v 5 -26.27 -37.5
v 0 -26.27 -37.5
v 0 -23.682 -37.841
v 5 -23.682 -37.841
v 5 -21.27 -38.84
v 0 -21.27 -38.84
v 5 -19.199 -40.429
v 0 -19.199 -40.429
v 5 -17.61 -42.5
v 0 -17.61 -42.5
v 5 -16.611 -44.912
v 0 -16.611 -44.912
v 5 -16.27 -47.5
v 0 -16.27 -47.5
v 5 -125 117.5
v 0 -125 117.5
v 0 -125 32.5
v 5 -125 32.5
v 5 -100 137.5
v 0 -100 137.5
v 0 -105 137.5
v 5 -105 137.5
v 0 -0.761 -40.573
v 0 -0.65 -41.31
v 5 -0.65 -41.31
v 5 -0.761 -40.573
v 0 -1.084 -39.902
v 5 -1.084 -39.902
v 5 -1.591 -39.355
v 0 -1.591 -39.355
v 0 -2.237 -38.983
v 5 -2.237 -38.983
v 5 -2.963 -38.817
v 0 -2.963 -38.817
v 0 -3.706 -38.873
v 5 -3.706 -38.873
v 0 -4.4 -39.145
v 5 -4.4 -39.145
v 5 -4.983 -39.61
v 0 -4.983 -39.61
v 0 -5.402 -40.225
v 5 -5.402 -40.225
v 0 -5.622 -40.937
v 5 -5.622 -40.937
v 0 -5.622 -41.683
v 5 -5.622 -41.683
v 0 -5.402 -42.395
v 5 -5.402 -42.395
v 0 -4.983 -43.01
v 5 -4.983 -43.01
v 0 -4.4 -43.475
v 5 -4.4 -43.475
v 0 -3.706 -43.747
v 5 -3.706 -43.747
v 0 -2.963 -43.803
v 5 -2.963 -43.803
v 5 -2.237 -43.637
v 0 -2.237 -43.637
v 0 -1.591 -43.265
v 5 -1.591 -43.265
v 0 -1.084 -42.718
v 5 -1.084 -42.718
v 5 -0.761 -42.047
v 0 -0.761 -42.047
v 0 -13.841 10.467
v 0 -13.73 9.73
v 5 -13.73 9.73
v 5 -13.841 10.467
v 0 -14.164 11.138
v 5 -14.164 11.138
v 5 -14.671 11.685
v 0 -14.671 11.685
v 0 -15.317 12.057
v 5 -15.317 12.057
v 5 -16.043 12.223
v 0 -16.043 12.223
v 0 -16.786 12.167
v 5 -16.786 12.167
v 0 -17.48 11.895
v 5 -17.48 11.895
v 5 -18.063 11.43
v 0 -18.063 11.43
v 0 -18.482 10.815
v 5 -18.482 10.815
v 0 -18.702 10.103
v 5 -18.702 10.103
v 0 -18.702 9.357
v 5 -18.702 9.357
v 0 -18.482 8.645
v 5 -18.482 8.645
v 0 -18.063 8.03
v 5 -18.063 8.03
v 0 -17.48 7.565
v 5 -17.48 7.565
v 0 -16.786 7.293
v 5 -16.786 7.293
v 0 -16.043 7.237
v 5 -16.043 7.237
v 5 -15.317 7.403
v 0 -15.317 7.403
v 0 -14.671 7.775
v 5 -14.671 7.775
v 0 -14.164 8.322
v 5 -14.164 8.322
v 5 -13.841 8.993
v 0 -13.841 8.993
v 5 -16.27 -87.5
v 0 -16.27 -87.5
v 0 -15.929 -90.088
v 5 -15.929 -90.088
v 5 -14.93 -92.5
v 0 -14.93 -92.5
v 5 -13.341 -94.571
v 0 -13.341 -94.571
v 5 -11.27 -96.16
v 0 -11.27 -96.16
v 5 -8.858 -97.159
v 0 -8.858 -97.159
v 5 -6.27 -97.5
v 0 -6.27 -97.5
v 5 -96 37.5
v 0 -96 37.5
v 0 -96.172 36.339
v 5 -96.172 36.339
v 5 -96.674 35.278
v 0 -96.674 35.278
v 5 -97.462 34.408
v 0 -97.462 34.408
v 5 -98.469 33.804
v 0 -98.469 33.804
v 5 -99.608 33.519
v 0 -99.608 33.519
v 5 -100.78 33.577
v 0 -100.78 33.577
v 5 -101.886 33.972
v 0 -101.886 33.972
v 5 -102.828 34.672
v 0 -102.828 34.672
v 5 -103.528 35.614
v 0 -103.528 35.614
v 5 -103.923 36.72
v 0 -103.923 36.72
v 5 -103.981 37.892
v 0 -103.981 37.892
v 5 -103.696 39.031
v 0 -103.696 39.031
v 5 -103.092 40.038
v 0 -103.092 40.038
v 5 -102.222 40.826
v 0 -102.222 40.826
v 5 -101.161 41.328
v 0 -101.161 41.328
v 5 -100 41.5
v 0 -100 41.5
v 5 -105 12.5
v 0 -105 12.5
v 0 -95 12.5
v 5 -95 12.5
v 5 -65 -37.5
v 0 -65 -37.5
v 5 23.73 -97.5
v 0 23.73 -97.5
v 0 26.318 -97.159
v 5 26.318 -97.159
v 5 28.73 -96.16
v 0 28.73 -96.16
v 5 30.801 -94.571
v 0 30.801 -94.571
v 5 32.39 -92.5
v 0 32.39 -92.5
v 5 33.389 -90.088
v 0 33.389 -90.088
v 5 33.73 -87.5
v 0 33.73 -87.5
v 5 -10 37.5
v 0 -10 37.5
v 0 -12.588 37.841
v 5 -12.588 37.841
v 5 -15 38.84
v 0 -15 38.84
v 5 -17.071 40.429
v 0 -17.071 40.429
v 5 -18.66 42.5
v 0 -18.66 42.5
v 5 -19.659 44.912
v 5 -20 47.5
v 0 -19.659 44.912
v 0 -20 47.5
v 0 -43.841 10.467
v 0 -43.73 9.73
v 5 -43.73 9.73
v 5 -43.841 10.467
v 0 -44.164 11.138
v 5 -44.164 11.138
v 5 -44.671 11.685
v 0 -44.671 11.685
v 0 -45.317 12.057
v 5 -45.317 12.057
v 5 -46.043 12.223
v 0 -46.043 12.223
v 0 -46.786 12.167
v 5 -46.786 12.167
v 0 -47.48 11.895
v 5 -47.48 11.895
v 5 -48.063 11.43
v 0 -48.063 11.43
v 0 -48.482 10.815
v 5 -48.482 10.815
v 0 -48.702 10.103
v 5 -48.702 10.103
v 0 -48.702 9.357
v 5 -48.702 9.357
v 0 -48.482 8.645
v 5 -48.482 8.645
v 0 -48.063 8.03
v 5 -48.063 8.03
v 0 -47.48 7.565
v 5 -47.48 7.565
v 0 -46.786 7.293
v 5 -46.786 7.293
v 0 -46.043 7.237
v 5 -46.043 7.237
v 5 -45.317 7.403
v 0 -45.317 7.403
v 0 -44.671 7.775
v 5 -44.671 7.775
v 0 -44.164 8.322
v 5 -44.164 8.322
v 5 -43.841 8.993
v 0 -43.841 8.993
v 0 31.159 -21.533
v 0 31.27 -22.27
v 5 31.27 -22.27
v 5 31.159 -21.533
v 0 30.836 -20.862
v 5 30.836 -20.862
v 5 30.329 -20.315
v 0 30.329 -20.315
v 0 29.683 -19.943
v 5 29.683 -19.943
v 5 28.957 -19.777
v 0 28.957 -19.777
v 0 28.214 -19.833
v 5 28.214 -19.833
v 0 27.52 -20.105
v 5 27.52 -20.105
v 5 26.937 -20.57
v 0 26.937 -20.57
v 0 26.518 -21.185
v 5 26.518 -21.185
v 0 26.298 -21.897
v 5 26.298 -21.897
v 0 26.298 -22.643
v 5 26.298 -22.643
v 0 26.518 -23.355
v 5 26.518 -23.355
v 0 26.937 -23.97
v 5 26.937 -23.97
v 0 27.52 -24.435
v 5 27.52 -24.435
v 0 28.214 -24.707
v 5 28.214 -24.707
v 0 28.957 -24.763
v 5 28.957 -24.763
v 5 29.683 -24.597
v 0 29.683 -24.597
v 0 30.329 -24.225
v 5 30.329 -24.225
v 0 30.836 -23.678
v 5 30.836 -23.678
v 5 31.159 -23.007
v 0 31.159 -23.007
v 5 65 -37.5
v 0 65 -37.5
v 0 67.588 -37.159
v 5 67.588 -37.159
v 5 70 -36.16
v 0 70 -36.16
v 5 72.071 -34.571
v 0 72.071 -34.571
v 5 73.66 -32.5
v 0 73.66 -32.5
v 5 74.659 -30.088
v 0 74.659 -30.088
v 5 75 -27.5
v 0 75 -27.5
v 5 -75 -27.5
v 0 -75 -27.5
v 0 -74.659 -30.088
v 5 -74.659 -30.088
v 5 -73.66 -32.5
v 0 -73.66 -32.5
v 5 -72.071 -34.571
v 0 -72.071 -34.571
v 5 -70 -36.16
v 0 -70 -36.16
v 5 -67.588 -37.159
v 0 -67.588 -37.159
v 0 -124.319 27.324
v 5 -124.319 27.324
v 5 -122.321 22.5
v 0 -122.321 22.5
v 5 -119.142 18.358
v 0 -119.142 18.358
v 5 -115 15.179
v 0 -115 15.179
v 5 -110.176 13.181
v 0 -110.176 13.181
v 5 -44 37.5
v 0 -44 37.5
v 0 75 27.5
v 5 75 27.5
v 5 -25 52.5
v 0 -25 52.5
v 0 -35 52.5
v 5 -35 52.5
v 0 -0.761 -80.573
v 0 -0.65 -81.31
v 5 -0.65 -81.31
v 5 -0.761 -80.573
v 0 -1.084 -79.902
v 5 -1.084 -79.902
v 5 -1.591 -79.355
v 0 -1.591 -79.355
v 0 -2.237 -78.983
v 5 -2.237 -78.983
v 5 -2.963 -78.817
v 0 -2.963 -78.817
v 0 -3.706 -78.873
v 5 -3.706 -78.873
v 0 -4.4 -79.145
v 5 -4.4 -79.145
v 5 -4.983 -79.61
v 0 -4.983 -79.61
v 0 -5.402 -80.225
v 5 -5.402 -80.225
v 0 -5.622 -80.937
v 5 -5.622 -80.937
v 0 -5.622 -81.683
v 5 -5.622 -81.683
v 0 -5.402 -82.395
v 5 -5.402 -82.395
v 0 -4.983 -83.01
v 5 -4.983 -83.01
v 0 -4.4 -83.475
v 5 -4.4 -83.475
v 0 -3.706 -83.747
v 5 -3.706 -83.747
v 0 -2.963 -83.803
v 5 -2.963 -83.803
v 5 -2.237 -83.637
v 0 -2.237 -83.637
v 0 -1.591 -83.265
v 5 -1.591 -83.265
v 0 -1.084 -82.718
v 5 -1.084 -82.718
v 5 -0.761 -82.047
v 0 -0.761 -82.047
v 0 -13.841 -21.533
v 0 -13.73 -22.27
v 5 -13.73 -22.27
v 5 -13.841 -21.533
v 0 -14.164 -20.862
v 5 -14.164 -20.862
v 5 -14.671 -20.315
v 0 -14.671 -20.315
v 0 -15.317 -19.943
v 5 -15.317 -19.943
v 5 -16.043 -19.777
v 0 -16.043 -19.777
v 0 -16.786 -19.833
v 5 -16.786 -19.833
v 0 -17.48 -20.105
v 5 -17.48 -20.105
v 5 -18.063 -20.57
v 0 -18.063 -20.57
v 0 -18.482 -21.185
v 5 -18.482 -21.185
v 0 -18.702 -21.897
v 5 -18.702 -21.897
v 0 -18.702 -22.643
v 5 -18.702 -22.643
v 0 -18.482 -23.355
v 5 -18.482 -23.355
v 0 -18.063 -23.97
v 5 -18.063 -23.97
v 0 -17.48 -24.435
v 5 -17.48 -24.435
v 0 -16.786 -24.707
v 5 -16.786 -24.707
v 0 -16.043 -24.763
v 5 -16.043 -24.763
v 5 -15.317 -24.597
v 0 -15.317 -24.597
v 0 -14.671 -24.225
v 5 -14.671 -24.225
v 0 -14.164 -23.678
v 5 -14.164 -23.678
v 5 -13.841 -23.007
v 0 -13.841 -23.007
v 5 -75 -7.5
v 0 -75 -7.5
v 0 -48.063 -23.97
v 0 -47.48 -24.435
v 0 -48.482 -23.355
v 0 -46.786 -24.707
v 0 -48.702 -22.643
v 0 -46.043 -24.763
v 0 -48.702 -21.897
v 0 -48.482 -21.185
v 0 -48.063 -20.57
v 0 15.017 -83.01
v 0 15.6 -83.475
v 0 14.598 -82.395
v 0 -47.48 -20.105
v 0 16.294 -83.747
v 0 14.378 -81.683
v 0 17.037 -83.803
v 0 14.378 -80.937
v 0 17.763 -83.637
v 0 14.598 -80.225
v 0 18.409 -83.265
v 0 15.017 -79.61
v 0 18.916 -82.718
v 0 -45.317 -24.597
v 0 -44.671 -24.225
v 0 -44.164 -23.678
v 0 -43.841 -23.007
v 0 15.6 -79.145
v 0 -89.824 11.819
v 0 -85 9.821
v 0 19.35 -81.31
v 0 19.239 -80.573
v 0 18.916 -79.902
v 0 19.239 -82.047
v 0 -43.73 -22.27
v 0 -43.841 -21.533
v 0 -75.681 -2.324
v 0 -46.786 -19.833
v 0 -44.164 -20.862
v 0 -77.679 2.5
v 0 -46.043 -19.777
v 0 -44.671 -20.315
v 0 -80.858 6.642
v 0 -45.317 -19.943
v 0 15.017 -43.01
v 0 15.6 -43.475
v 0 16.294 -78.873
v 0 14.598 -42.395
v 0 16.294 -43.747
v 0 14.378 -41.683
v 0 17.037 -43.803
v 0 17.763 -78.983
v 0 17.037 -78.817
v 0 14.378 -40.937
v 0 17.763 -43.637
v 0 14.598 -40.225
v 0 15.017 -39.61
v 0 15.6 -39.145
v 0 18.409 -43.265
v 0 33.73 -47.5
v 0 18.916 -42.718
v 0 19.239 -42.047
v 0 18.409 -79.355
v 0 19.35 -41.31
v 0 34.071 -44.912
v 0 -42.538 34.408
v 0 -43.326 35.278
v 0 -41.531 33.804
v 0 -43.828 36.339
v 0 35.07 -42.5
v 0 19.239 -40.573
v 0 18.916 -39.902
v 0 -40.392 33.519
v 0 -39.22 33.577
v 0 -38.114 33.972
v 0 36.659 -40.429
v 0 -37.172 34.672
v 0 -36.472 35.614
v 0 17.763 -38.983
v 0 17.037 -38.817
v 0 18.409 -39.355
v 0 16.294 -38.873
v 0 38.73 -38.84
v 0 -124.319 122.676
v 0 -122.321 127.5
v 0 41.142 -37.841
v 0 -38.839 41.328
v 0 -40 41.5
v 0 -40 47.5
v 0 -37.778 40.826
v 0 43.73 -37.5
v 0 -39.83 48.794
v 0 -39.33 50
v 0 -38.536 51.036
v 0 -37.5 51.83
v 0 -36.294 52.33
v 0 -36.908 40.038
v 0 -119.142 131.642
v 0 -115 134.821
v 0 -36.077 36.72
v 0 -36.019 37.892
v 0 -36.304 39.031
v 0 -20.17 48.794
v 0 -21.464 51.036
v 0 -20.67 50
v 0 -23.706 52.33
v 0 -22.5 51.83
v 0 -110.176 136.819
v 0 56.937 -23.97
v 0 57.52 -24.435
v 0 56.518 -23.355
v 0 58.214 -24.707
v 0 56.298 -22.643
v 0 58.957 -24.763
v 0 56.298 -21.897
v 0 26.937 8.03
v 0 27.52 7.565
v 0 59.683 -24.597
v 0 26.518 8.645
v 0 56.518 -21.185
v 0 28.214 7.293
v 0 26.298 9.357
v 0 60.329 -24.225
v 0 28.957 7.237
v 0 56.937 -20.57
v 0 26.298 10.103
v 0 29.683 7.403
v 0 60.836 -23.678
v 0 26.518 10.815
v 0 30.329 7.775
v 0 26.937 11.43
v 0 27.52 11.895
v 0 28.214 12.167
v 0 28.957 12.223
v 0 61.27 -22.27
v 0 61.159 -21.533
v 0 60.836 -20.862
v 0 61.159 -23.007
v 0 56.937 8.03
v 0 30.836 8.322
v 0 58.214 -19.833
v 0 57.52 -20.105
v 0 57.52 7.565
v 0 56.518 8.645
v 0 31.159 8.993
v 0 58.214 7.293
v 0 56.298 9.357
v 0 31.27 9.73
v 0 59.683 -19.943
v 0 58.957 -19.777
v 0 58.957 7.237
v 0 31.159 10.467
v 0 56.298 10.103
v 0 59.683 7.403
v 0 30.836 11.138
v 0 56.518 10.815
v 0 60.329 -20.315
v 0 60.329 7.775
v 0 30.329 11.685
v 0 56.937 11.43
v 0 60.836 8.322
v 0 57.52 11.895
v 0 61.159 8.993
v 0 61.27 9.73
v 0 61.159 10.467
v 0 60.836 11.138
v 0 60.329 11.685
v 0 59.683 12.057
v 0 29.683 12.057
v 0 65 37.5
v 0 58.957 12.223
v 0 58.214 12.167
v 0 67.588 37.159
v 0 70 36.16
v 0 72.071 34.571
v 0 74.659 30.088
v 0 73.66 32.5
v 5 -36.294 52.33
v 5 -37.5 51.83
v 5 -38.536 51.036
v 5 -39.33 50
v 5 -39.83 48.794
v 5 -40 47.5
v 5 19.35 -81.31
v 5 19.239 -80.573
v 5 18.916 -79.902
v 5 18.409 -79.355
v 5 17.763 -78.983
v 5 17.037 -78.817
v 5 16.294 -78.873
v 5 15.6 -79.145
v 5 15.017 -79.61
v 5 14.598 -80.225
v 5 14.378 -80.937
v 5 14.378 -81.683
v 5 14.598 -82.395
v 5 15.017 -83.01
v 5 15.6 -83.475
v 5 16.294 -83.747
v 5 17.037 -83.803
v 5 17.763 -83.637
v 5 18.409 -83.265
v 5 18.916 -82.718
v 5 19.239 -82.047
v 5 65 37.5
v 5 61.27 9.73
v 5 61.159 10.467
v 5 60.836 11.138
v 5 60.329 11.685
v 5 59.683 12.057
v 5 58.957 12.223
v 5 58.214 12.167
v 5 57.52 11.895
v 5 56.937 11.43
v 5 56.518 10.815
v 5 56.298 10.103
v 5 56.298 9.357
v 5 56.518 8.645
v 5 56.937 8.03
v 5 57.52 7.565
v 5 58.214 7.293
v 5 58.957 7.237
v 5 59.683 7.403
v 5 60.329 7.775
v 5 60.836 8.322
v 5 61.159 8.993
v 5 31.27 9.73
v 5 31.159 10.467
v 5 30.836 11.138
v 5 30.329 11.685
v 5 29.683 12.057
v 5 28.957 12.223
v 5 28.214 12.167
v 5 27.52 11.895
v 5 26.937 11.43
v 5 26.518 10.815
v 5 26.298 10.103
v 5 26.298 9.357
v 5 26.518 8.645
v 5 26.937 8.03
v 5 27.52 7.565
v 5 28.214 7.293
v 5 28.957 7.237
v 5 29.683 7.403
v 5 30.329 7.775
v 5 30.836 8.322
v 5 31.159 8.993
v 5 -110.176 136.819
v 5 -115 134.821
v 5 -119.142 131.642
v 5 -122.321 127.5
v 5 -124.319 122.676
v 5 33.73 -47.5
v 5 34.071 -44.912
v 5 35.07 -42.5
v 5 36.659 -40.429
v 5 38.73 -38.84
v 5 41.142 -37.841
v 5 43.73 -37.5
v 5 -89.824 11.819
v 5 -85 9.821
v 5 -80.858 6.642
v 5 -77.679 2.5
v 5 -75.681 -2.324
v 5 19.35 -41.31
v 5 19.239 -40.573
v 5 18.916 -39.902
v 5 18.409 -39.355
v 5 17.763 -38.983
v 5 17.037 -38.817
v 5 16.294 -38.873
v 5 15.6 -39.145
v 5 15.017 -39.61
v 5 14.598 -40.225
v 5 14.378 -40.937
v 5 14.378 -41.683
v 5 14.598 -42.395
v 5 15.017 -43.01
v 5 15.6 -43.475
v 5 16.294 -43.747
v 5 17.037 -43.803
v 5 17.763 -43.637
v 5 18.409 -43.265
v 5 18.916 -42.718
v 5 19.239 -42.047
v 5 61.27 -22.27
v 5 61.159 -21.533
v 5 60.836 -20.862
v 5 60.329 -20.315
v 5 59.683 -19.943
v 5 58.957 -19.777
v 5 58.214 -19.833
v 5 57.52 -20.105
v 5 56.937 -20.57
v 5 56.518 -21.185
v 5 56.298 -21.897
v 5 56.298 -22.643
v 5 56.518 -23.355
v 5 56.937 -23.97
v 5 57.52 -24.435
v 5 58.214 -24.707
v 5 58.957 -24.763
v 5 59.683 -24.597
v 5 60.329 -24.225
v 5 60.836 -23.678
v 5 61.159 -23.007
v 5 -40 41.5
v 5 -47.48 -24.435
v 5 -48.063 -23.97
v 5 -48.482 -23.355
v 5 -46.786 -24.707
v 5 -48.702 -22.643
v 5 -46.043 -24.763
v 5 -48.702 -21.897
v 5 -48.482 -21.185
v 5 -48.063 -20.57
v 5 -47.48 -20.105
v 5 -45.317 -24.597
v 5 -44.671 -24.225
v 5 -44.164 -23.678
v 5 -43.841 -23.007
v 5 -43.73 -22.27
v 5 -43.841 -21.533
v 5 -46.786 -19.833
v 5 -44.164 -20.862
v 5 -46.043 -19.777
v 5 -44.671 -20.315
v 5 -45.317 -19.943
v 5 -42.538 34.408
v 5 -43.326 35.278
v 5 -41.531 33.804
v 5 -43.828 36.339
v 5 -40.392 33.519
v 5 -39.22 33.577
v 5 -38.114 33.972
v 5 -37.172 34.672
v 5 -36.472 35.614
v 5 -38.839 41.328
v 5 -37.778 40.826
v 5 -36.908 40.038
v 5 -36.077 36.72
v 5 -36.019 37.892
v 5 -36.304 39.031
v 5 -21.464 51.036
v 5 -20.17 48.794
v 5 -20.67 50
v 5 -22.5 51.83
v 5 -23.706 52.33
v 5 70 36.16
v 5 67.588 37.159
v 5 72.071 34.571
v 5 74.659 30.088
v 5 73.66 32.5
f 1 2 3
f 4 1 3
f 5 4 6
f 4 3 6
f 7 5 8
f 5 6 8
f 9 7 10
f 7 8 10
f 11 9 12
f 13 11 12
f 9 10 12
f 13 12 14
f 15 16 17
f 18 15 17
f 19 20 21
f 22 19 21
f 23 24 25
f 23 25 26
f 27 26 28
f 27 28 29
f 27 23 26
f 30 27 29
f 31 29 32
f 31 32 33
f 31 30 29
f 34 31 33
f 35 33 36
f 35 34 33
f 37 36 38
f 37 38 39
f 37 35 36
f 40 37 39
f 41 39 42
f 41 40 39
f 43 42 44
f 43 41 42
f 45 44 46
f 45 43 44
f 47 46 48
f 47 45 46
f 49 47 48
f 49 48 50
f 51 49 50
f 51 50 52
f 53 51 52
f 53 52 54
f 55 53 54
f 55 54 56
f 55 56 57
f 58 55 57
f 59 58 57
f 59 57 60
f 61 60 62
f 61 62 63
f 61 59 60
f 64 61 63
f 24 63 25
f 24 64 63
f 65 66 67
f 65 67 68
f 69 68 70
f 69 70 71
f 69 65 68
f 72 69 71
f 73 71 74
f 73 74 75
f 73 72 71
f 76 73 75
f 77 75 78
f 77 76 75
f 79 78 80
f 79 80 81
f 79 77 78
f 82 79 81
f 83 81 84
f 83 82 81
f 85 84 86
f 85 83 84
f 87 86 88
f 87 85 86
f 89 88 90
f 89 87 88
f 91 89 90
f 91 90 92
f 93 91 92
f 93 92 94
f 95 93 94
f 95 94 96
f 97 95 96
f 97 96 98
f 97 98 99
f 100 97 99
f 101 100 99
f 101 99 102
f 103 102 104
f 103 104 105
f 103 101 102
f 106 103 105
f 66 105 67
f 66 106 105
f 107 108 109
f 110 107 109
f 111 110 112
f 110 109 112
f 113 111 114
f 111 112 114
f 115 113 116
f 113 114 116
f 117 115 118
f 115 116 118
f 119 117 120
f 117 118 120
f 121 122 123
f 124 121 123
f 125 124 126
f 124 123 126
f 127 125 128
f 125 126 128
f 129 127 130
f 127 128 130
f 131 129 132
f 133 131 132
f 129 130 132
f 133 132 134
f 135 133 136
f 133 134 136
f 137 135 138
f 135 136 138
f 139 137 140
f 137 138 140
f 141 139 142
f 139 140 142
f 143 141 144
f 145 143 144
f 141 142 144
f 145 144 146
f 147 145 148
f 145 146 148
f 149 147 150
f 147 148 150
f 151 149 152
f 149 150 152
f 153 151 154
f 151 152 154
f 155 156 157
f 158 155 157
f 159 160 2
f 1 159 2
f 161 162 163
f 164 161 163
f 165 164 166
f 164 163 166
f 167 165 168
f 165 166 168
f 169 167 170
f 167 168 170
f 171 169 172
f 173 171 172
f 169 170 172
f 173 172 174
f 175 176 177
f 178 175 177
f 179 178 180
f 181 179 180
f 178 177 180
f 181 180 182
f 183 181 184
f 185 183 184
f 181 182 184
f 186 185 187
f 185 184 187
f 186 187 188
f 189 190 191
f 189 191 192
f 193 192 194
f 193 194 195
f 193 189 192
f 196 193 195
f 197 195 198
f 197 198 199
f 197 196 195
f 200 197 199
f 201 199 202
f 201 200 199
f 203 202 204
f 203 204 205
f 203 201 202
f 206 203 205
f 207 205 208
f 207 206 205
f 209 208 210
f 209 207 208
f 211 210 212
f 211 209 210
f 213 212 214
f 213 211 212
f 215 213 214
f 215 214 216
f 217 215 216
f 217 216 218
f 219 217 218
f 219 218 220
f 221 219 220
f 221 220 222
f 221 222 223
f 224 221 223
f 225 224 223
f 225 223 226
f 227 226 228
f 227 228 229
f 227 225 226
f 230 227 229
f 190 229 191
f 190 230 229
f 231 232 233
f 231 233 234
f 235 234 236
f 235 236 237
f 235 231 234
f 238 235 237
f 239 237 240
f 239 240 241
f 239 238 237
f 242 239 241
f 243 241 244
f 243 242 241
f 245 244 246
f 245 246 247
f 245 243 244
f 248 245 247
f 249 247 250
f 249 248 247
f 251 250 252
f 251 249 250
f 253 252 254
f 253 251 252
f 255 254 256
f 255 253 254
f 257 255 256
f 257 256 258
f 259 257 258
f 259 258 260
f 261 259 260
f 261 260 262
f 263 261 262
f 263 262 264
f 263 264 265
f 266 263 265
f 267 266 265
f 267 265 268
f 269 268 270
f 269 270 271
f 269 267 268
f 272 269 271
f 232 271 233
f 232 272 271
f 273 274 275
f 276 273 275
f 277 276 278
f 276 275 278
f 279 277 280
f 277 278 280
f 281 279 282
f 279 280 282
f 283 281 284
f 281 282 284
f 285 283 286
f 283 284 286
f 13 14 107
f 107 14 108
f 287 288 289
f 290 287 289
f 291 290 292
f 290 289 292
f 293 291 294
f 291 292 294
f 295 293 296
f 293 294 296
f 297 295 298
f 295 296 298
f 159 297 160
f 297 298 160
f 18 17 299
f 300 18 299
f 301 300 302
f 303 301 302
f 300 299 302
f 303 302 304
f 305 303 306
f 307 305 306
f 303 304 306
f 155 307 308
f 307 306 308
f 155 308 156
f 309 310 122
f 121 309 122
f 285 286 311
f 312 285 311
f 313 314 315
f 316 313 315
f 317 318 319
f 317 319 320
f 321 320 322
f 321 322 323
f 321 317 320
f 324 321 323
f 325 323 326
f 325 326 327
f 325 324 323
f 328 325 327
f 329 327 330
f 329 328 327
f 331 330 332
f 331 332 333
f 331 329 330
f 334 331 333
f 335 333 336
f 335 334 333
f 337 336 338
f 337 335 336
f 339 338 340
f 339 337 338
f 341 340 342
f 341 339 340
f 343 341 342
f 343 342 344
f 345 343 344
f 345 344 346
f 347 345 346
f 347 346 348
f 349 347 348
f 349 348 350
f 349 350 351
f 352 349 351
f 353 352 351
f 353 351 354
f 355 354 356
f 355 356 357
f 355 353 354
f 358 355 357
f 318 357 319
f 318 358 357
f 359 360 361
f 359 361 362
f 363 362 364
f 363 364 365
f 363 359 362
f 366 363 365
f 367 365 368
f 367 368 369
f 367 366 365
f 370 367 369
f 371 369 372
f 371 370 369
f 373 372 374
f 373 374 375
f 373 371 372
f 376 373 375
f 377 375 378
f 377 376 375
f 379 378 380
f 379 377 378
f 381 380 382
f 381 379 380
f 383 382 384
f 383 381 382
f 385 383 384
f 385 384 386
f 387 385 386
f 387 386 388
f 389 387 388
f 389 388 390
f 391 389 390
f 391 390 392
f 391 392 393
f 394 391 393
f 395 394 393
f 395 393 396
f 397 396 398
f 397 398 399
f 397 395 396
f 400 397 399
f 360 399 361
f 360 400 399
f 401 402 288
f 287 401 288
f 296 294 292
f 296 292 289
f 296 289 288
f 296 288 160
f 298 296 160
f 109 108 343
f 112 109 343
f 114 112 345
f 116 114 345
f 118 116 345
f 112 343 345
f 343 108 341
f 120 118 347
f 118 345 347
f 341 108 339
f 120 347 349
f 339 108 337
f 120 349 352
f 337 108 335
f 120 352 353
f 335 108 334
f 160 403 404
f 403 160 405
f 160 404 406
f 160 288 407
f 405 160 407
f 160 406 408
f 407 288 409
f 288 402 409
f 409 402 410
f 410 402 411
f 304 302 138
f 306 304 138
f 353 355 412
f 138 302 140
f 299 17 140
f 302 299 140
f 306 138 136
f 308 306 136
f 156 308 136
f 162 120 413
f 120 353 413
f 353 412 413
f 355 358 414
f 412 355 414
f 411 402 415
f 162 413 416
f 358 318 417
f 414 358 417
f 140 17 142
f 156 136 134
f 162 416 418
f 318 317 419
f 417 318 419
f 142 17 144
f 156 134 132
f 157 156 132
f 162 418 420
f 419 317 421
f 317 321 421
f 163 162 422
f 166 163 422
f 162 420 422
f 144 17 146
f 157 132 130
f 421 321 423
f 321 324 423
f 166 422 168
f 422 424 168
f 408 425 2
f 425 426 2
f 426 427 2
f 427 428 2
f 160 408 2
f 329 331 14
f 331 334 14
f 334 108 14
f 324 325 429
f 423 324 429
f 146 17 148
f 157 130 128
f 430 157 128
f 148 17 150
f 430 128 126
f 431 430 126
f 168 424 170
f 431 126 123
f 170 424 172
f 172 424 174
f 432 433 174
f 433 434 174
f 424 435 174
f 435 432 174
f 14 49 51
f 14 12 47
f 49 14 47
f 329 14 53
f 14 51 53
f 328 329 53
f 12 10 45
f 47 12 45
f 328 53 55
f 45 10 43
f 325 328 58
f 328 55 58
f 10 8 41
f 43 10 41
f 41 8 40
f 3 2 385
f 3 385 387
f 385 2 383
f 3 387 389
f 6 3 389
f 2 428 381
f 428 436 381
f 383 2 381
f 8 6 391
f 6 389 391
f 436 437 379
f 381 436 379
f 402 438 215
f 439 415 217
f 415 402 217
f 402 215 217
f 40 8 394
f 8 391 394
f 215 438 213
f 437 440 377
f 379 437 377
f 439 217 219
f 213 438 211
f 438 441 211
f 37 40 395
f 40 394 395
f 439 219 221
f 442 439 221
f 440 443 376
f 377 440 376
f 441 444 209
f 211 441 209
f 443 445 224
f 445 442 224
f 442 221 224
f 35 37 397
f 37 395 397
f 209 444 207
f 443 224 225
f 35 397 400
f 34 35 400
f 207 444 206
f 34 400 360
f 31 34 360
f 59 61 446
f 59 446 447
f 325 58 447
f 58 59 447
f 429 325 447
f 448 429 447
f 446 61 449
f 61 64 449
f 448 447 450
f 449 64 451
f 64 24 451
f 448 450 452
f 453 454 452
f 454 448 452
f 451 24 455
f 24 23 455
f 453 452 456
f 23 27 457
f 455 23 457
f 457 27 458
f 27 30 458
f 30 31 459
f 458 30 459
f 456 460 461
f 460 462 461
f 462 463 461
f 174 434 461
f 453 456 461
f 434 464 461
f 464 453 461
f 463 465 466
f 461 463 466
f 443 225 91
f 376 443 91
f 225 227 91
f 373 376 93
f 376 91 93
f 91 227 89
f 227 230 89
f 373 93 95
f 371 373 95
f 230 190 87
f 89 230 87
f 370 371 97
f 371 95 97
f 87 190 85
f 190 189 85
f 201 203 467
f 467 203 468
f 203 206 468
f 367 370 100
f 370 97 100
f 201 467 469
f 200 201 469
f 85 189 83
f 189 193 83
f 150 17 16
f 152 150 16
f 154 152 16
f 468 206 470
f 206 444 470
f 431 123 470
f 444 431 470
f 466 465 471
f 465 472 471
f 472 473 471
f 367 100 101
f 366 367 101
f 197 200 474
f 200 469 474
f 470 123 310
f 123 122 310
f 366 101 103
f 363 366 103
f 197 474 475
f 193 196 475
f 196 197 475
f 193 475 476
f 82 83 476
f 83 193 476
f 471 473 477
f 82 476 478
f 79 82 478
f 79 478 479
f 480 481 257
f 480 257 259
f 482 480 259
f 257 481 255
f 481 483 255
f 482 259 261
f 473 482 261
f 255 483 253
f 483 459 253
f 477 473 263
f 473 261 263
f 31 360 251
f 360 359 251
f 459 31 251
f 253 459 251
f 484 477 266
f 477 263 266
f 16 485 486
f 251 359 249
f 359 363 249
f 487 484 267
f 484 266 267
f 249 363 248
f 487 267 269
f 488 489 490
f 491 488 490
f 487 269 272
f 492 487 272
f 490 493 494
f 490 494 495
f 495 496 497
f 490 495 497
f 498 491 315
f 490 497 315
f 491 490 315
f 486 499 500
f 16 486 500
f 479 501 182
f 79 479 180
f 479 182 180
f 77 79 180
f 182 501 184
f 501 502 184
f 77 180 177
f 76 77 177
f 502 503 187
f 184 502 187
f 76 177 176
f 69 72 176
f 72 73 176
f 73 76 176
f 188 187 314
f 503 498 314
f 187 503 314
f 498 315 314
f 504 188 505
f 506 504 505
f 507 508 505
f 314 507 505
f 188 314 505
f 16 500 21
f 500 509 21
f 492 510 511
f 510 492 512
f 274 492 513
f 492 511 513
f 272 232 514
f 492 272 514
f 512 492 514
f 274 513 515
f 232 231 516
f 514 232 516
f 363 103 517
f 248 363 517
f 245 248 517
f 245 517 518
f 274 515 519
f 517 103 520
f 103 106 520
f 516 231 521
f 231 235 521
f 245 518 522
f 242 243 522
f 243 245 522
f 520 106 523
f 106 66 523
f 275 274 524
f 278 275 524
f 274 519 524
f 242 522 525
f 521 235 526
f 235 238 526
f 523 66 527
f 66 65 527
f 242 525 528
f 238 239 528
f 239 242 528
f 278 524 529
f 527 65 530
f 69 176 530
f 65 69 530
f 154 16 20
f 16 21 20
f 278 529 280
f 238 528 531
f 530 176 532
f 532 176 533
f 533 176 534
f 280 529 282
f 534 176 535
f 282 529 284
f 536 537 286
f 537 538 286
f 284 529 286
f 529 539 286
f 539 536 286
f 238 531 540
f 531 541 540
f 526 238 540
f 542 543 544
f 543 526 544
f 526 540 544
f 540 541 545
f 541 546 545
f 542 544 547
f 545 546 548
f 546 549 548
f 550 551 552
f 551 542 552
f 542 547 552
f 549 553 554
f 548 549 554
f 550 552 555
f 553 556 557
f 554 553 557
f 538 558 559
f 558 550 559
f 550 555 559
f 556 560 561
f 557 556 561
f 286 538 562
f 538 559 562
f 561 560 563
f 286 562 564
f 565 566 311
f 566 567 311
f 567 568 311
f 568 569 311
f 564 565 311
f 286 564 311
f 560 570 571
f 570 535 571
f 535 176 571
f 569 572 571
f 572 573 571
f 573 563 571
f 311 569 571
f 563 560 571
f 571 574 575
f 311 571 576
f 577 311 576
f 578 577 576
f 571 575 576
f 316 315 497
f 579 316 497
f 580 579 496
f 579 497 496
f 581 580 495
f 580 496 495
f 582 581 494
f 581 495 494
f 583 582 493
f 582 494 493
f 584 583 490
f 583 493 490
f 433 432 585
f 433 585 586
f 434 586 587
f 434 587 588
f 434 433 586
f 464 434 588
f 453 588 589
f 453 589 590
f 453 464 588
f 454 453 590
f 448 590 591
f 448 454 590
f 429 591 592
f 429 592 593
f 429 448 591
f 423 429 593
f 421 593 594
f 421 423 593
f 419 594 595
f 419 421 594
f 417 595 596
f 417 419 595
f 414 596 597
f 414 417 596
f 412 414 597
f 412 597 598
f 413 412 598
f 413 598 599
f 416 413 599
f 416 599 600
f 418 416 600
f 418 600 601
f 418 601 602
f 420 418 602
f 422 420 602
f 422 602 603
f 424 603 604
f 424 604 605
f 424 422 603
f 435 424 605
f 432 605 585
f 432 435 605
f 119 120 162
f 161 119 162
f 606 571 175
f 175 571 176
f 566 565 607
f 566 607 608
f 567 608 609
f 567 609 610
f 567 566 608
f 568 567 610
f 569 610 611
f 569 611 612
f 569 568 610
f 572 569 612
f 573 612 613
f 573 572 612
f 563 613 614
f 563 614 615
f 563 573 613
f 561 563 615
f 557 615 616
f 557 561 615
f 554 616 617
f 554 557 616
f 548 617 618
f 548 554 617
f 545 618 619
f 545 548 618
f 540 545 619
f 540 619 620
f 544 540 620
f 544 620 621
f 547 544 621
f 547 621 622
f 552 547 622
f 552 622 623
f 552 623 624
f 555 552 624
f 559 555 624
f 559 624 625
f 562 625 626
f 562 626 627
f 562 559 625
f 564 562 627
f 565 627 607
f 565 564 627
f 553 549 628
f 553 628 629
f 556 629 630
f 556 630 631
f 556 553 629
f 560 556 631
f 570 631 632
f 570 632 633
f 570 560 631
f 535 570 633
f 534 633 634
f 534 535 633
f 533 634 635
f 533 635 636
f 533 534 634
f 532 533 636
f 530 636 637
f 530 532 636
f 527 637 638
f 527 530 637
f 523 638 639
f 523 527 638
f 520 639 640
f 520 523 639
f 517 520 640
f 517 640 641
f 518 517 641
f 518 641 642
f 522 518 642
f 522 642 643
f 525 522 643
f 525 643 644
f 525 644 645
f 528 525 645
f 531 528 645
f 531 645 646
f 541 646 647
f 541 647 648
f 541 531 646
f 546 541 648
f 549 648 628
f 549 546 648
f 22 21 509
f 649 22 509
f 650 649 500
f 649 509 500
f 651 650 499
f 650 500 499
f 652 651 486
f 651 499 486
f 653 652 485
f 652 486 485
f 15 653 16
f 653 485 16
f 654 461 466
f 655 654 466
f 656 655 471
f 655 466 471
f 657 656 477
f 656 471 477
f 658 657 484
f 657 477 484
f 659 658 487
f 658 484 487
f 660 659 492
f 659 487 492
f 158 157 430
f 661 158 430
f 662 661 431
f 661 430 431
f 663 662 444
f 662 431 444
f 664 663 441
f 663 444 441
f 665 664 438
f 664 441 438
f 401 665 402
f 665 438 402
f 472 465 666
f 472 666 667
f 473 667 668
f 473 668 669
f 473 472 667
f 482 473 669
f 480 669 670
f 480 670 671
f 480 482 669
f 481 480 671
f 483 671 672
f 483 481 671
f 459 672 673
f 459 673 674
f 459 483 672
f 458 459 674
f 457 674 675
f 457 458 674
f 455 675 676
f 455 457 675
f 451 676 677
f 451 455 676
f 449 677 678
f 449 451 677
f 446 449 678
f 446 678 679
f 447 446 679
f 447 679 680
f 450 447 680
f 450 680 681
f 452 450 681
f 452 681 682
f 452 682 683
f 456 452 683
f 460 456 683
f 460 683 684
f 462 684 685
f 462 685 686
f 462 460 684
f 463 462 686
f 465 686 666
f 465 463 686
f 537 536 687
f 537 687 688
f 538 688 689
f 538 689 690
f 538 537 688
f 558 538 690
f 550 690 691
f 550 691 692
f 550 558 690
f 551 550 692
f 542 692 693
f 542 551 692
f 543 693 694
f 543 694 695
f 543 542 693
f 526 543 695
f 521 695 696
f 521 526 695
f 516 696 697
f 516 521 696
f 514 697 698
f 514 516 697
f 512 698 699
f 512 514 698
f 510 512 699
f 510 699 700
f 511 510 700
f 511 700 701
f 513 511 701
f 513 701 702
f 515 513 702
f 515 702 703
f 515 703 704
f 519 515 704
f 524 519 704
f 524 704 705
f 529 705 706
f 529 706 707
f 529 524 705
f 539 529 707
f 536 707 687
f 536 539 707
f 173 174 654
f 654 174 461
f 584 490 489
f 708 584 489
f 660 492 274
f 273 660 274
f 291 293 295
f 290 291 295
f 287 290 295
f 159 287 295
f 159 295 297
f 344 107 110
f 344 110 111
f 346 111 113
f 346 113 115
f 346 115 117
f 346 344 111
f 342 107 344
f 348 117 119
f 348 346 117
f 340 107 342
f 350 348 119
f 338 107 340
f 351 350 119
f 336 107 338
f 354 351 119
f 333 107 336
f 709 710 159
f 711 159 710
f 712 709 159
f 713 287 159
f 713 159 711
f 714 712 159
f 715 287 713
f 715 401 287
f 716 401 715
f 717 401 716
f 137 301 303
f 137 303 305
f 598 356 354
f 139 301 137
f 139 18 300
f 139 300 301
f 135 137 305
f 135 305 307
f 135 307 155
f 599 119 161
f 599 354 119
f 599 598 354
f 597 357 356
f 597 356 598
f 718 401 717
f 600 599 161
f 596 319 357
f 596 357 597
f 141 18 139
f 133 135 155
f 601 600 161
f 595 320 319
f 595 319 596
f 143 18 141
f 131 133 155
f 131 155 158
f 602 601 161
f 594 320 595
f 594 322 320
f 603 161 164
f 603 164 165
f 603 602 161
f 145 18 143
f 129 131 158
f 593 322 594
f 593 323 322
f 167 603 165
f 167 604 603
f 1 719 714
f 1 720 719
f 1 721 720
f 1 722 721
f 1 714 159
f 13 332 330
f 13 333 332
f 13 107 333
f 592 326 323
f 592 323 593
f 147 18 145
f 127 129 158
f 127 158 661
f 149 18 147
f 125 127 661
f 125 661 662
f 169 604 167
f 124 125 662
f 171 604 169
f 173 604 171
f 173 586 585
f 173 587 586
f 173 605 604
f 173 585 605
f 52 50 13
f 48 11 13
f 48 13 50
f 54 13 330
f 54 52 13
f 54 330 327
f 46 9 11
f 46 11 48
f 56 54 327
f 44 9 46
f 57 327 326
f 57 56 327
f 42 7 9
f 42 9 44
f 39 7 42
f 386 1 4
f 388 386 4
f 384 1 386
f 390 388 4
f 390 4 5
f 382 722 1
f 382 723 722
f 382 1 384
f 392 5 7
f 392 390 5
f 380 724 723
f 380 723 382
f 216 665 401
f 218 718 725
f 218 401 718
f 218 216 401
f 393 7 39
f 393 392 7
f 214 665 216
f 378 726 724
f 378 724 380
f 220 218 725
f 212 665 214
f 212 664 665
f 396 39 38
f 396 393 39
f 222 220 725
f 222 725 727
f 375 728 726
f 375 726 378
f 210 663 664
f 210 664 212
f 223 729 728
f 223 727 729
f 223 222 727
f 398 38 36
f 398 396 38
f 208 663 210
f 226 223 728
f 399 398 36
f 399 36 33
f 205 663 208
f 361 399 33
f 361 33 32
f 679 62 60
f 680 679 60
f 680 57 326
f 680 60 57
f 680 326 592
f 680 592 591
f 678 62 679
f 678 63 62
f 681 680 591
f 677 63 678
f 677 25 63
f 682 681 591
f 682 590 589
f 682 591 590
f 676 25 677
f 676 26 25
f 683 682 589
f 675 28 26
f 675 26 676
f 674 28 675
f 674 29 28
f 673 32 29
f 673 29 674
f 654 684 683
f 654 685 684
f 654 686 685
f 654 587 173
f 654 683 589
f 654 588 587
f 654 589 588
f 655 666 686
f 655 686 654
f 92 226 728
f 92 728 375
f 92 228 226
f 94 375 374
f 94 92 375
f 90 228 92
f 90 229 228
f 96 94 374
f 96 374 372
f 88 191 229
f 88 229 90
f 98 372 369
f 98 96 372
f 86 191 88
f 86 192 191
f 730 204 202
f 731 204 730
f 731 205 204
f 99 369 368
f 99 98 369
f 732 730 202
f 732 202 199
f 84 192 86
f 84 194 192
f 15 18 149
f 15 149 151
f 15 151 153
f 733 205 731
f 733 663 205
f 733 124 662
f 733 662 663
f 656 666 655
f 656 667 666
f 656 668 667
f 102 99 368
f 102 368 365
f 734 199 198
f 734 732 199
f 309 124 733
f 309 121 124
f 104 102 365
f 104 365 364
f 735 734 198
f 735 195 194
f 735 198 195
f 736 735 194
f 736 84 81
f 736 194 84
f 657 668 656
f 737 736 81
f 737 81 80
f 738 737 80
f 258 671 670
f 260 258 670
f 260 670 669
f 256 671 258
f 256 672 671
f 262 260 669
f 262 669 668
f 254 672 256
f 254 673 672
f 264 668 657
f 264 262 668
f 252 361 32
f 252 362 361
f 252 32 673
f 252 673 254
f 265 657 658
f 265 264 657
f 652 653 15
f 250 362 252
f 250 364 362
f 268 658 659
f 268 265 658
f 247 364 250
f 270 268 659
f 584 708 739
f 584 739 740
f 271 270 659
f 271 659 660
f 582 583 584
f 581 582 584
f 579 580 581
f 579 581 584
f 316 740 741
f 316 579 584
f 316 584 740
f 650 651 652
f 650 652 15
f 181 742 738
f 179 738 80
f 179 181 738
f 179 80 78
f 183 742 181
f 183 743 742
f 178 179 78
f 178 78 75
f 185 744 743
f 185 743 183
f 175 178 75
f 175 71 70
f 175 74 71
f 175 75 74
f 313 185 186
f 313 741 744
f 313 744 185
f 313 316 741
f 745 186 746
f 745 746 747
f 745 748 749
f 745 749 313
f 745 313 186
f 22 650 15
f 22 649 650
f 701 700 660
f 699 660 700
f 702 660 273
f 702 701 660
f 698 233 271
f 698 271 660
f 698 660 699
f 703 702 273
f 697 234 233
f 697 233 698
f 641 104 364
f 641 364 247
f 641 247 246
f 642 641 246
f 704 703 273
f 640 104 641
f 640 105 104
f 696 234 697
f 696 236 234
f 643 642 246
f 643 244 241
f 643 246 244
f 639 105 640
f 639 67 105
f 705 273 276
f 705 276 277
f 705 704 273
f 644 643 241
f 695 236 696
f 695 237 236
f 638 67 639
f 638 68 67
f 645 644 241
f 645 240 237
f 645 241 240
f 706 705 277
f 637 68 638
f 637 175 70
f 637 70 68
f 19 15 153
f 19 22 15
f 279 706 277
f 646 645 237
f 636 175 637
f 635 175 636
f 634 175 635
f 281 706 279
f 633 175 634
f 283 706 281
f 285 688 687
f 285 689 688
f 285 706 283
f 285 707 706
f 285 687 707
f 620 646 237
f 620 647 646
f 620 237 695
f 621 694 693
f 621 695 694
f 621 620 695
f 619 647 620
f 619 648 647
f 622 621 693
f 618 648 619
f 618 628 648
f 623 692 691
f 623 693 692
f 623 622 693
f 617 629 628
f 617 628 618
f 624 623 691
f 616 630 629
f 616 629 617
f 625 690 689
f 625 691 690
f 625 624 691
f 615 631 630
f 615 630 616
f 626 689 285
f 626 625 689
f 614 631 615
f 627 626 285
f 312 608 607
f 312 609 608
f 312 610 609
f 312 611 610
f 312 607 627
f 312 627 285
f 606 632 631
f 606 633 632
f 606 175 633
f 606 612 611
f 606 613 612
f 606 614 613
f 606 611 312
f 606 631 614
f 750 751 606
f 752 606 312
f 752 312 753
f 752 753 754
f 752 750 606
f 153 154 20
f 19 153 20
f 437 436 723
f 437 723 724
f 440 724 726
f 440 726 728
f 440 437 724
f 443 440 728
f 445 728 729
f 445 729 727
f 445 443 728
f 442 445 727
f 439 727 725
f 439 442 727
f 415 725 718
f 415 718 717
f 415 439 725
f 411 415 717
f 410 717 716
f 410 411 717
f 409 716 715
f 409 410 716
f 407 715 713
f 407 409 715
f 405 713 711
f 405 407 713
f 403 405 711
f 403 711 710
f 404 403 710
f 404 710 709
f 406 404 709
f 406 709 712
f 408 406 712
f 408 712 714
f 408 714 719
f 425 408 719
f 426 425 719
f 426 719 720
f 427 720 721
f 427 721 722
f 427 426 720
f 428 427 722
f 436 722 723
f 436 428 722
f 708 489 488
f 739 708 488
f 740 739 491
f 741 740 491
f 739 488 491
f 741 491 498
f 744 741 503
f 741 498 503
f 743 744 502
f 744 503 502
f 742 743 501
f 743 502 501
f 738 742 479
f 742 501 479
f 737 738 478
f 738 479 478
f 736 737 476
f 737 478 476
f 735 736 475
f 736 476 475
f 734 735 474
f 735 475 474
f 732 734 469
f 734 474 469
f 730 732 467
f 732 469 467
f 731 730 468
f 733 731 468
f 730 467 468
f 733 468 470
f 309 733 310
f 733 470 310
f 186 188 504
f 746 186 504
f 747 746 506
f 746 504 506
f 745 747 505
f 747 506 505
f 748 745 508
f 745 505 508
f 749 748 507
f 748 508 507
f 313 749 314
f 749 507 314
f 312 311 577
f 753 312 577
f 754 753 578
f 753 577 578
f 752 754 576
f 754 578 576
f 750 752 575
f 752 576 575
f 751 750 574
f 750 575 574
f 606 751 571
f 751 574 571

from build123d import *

# Parameters (mm, degrees)
F0_R     = 2.5
F1_DEPTH = 5


with BuildPart() as f1:
    # F0 (on Right) → F1 (new body)
    with BuildSketch(Plane.YZ):
        with BuildLine():
            Line((43.73, -37.5), (65, -37.5))
            ThreePointArc((65, -37.5), (72.071068, -34.571068), (75, -27.5))
            Line((75, -27.5), (75, 27.5))
            ThreePointArc((75, 27.5), (72.071068, 34.571068), (65, 37.5))
            Line((65, 37.5), (-10, 37.5))
            ThreePointArc((-10, 37.5), (-17.071068, 40.428932), (-20, 47.5))
            ThreePointArc((-20, 47.5), (-21.464466, 51.035534), (-25, 52.5))
            Line((-25, 52.5), (-35, 52.5))
            ThreePointArc((-35, 52.5), (-38.535534, 51.035534), (-40, 47.5))
            Line((-40, 47.5), (-40, 41.5))
            ThreePointArc((-40, 41.5), (-37.171573, 34.671573), (-44, 37.5))
            Line((-44, 37.5), (-96, 37.5))
            ThreePointArc((-96, 37.5), (-102.828427, 34.671573), (-100, 41.5))
            Line((-100, 41.5), (-100, 137.5))
            Line((-100, 137.5), (-105, 137.5))
            ThreePointArc((-105, 137.5), (-119.142136, 131.642136), (-125, 117.5))
            Line((-125, 117.5), (-125, 32.5))
            ThreePointArc((-125, 32.5), (-119.142136, 18.357864), (-105, 12.5))
            Line((-105, 12.5), (-95, 12.5))
            ThreePointArc((-95, 12.5), (-80.857864, 6.642136), (-75, -7.5))
            Line((-75, -7.5), (-75, -27.5))
            ThreePointArc((-75, -27.5), (-72.071068, -34.571068), (-65, -37.5))
            Line((-65, -37.5), (-26.27, -37.5))
            ThreePointArc((-26.27, -37.5), (-19.198932, -40.428932), (-16.27, -47.5))
            Line((-16.27, -47.5), (-16.27, -87.5))
            ThreePointArc((-16.27, -87.5), (-13.341068, -94.571068), (-6.27, -97.5))
            Line((-6.27, -97.5), (23.73, -97.5))
            ThreePointArc((23.73, -97.5), (30.801068, -94.571068), (33.73, -87.5))
            Line((33.73, -87.5), (33.73, -47.5))
            ThreePointArc((33.73, -47.5), (36.658932, -40.428932), (43.73, -37.5))
        make_face()
        with Locations((-46.23, -22.27)):
            Circle(F0_R, mode=Mode.SUBTRACT)
        with Locations((-46.23, 9.73)):
            Circle(F0_R, mode=Mode.SUBTRACT)
        with Locations((-3.15, -81.31)):
            Circle(F0_R, mode=Mode.SUBTRACT)
        with Locations((16.85, -81.31)):
            Circle(F0_R, mode=Mode.SUBTRACT)
        with Locations((-3.15, -41.31)):
            Circle(F0_R, mode=Mode.SUBTRACT)
        with Locations((16.85, -41.31)):
            Circle(F0_R, mode=Mode.SUBTRACT)
        with Locations((-16.23, -22.27)):
            Circle(F0_R, mode=Mode.SUBTRACT)
        with Locations((-16.23, 9.73)):
            Circle(F0_R, mode=Mode.SUBTRACT)
        with Locations((28.77, -22.27)):
            Circle(F0_R, mode=Mode.SUBTRACT)
        with Locations((58.77, -22.27)):
            Circle(F0_R, mode=Mode.SUBTRACT)
        with Locations((28.77, 9.73)):
            Circle(F0_R, mode=Mode.SUBTRACT)
        with Locations((58.77, 9.73)):
            Circle(F0_R, mode=Mode.SUBTRACT)
    extrude(amount=F1_DEPTH)


solid = f1.part
